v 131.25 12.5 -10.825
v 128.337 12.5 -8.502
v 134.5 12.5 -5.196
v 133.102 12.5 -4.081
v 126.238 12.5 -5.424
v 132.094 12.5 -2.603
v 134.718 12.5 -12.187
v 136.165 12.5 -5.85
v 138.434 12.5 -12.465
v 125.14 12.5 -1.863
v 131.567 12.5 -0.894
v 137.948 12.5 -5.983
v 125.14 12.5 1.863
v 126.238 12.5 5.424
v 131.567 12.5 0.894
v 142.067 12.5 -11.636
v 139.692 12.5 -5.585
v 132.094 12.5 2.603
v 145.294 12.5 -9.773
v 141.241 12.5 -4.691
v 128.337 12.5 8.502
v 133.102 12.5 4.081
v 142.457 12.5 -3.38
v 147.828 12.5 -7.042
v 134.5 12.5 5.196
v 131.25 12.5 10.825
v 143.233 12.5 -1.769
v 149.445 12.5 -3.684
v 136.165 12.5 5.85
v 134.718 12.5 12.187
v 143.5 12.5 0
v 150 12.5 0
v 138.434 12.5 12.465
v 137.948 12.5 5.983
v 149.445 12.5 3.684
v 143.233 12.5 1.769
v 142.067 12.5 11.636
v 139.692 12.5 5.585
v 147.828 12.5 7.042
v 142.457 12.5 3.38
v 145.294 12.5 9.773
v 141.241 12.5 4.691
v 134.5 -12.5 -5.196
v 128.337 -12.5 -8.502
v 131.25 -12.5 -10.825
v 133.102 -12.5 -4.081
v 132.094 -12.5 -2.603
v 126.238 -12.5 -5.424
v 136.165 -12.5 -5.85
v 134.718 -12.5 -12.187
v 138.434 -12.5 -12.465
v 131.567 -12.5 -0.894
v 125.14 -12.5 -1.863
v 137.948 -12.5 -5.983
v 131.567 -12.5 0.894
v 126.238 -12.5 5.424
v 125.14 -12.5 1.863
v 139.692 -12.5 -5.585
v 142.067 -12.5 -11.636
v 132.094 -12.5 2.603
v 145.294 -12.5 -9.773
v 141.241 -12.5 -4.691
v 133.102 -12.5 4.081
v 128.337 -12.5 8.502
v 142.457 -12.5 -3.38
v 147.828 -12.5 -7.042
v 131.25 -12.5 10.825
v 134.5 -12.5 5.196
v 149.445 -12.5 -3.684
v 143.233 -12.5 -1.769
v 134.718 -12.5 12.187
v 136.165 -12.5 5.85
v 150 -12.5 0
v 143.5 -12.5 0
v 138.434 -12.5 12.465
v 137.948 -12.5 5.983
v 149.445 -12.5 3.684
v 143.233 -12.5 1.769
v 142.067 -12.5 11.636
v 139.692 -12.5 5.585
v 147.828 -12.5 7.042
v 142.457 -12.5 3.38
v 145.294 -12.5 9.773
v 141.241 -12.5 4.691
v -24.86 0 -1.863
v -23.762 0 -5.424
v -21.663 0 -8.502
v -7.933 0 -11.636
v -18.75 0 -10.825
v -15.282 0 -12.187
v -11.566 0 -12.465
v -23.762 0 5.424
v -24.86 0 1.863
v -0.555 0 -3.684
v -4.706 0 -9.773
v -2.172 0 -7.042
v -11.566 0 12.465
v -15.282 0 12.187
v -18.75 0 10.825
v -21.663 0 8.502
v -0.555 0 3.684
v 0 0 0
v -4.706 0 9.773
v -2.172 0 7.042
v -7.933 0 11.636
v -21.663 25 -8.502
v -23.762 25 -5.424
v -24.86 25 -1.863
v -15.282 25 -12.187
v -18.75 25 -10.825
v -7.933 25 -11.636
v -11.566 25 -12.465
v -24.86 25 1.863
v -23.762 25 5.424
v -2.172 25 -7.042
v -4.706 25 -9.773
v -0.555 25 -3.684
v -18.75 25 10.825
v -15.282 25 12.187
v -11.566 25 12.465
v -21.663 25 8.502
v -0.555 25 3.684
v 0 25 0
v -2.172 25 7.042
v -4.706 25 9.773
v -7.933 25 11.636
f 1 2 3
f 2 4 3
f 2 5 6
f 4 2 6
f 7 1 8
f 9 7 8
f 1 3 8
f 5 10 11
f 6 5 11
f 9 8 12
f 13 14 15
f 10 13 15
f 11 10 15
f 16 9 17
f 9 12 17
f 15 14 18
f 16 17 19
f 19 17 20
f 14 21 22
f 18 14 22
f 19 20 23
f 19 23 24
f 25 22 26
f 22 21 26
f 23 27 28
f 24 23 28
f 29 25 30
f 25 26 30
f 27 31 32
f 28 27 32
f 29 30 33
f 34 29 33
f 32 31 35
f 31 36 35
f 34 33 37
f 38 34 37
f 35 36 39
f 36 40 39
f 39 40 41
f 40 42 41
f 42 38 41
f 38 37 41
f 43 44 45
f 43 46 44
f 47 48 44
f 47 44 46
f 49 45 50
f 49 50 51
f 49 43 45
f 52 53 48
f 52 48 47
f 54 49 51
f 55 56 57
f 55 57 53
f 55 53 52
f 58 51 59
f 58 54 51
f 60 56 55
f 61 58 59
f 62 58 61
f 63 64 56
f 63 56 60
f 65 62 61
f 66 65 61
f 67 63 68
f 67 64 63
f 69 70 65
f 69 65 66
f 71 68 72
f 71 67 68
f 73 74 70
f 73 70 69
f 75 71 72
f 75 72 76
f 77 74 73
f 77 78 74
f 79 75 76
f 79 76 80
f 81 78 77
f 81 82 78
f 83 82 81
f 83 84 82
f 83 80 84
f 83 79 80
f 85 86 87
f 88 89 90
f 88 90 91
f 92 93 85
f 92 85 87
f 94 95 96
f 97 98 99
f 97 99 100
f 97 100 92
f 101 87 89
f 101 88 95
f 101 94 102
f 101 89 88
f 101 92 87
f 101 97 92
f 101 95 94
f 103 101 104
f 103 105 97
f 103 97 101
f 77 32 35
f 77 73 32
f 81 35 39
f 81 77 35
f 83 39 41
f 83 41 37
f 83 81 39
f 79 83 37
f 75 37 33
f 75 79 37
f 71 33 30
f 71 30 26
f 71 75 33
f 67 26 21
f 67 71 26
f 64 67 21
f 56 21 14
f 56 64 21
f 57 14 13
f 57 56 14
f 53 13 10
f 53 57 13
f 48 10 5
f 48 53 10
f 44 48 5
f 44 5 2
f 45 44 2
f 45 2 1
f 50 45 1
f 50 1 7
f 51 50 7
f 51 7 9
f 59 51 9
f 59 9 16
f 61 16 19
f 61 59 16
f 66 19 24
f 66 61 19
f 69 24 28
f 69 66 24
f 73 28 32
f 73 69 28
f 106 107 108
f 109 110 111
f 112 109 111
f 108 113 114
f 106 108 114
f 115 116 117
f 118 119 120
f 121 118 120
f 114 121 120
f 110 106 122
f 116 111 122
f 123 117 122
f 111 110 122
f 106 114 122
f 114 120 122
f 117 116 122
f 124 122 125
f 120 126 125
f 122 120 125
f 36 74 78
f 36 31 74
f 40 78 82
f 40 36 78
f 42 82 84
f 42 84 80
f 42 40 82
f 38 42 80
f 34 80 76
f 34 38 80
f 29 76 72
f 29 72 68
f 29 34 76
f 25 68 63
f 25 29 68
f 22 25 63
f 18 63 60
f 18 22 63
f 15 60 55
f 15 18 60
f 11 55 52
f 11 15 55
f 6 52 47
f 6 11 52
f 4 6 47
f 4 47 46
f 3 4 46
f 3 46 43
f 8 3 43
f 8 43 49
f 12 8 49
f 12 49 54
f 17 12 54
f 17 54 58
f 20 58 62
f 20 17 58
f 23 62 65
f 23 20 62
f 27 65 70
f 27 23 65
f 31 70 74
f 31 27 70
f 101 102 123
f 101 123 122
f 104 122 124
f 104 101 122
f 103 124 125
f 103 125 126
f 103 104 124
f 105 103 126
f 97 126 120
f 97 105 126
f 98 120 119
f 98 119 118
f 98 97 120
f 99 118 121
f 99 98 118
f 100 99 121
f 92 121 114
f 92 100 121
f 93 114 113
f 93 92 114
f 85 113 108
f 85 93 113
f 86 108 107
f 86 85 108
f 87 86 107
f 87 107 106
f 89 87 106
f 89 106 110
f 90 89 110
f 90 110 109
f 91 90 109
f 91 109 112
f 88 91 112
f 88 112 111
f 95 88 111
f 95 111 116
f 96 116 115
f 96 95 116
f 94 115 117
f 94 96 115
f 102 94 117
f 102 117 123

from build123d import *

# Parameters (mm, degrees)
F2_R     = 12.5
F2_R_2   = 6
F3_DEPTH = 25
F4_DEPTH = 12.5


with BuildPart() as f3:
    # F2 (on Front) → F3 (new body)
    with BuildSketch(Plane.XZ):
        with Locations((-12.5, 0)):
            Circle(F2_R)
        with Locations((-12.5, 0)):
            Circle(F2_R_2, mode=Mode.SUBTRACT)
        with Locations((-12.5, 0)):
            Circle(F2_R_2)
    extrude(amount=-F3_DEPTH)


with BuildPart() as f4:
    # F2 (on Front) → F4 (new body, symmetric)
    with BuildSketch(Plane.XZ):
        with Locations((137.5, 0)):
            Circle(F2_R)
        with Locations((137.5, 0)):
            Circle(F2_R_2, mode=Mode.SUBTRACT)
    extrude(amount=F4_DEPTH, both=True)


solid = Compound([f3.part, f4.part])
